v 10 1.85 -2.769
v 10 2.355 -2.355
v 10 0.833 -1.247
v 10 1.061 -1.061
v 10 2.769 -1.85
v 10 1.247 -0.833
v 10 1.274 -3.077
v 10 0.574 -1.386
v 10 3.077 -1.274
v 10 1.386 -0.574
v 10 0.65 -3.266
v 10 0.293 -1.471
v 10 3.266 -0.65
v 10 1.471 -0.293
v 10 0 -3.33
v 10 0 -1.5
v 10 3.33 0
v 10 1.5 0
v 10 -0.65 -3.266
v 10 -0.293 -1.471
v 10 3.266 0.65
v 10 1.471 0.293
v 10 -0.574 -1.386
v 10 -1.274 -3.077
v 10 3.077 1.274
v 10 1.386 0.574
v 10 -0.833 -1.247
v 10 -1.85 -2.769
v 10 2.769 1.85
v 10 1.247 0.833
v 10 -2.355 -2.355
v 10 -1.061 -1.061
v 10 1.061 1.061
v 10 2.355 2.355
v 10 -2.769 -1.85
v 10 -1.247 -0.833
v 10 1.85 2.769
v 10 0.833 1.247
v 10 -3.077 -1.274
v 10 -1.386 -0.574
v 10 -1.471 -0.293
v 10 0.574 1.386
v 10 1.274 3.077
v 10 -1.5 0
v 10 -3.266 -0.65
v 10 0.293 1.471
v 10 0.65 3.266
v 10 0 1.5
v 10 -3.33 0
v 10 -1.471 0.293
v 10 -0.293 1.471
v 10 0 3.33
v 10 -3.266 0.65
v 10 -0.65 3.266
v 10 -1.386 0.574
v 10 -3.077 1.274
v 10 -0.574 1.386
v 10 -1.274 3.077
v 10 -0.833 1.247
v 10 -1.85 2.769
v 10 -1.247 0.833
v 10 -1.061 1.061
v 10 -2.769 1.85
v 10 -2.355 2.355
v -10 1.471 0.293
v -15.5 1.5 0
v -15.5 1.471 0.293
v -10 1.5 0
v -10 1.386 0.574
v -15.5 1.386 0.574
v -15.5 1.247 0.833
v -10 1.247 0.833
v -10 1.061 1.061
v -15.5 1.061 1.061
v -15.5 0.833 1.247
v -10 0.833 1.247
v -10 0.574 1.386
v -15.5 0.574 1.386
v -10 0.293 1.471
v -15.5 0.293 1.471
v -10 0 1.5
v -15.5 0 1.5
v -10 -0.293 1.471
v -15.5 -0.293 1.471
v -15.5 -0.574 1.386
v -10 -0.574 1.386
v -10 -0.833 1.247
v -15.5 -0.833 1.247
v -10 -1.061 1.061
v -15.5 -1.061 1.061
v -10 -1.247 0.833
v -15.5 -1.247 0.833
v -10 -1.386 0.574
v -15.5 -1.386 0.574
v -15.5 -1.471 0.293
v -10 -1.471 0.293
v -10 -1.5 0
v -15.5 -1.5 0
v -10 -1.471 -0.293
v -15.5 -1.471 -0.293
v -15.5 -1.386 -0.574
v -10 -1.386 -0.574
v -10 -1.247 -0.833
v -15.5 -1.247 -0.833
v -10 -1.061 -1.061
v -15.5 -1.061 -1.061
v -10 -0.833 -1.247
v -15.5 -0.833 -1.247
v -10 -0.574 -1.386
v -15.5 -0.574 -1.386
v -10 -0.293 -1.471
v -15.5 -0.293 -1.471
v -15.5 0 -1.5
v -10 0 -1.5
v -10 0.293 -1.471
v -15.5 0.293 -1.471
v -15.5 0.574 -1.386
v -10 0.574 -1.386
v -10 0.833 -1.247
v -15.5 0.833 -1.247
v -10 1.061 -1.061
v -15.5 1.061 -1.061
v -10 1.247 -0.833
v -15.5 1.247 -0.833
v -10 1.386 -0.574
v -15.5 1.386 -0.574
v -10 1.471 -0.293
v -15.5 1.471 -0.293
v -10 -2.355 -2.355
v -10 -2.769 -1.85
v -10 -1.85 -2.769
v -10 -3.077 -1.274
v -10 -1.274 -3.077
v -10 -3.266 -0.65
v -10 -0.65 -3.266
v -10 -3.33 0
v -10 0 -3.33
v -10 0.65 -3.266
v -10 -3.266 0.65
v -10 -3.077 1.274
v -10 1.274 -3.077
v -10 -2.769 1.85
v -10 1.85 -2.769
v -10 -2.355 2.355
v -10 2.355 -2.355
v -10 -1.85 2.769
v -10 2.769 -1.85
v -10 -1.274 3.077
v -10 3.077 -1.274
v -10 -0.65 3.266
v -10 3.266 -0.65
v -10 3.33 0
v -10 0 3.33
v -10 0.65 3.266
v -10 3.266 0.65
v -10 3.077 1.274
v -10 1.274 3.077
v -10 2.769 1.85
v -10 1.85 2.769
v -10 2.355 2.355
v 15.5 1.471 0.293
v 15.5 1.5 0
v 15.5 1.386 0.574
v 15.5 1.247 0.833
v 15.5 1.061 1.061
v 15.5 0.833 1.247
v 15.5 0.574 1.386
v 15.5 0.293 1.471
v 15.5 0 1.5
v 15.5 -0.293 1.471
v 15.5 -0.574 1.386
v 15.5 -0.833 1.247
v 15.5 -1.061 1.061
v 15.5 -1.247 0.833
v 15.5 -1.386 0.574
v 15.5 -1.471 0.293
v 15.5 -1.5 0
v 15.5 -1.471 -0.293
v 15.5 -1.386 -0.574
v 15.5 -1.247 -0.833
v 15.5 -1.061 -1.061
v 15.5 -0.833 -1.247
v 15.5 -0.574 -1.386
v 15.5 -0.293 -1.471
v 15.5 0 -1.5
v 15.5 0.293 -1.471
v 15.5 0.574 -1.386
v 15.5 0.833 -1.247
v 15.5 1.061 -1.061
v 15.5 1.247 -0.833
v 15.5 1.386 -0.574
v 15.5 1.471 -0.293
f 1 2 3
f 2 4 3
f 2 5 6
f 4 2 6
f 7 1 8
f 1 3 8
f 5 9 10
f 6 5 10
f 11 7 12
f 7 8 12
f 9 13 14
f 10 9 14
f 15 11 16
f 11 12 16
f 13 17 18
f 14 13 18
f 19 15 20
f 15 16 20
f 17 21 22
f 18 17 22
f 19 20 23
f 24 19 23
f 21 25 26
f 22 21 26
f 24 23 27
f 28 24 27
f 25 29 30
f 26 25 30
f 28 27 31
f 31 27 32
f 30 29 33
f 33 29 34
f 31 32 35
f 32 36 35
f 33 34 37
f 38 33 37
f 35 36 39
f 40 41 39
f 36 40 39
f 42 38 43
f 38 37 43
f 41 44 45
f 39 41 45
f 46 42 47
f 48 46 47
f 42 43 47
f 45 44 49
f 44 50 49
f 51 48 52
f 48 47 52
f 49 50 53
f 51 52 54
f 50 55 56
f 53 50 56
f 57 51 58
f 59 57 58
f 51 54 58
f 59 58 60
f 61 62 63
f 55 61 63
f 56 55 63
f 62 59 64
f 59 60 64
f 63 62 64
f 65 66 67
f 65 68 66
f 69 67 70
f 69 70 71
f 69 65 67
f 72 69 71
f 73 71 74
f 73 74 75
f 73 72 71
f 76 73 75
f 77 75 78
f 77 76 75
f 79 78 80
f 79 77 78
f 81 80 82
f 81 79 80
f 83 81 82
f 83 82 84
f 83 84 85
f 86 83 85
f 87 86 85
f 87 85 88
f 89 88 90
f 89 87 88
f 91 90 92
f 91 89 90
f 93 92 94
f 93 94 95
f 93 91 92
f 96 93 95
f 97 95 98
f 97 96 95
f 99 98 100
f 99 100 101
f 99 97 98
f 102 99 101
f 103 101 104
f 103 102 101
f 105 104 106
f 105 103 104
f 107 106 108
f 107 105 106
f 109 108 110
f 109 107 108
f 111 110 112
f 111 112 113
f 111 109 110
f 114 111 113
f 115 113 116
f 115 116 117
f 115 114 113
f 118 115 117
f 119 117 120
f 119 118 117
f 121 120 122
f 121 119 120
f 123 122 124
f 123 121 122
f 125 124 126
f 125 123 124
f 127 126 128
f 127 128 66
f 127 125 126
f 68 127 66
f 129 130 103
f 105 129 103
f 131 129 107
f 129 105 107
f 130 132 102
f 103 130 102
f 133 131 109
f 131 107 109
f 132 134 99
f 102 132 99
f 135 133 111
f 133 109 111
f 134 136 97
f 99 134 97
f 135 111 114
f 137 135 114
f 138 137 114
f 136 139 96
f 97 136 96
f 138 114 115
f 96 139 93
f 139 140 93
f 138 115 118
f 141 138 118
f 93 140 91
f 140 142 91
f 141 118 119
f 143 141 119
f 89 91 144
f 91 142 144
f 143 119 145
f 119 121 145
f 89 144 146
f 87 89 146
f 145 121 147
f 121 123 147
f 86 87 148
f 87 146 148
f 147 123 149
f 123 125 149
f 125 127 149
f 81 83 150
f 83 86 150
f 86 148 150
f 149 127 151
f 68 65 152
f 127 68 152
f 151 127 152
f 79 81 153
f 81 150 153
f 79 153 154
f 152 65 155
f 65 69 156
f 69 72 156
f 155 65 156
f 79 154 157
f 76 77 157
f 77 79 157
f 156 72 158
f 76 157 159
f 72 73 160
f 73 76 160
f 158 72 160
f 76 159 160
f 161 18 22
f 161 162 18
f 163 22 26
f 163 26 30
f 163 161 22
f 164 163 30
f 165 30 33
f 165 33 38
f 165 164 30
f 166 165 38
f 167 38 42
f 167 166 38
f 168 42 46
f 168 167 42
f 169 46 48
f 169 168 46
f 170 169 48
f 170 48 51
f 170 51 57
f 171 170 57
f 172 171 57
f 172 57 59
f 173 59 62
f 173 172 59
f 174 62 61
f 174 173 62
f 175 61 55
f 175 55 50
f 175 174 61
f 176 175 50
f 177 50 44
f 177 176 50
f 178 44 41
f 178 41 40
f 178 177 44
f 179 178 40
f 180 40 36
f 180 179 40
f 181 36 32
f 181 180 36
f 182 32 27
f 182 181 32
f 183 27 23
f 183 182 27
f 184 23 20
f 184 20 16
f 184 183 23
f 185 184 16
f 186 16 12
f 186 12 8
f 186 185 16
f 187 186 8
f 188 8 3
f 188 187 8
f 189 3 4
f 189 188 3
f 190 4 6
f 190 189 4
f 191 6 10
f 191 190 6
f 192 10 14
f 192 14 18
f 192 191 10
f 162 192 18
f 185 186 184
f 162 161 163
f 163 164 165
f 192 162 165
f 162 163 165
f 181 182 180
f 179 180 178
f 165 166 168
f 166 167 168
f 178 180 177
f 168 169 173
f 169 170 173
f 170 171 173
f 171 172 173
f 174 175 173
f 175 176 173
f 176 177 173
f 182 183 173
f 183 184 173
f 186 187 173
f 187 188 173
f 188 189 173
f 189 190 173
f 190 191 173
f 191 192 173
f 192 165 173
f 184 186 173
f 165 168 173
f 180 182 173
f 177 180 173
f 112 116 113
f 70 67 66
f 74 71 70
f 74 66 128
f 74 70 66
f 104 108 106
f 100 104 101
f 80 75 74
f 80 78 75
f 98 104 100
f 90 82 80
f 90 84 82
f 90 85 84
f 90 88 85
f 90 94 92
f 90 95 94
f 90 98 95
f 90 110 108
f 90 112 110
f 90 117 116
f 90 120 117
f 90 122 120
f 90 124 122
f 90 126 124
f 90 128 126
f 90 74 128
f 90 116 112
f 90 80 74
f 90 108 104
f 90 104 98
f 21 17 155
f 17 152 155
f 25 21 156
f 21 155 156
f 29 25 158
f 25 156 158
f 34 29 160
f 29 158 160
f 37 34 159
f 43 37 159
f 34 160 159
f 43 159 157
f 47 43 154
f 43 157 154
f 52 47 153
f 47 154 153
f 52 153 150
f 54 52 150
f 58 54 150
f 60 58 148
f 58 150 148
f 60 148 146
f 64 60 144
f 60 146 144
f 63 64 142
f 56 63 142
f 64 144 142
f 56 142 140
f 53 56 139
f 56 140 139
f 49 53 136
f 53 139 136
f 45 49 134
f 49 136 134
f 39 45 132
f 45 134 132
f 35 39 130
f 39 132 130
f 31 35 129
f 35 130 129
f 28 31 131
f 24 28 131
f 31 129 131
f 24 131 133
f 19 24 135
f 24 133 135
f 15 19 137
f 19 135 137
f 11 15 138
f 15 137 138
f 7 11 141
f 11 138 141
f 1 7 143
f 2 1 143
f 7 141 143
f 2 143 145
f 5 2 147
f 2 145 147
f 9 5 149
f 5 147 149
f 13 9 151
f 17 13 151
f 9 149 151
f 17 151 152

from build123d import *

# Parameters (mm, degrees)
SKETCH1_W = 5.5
SKETCH1_H = 1.5


with BuildPart() as part:
    # Sketch1 → Revolve1 (revolve)
    with BuildSketch(Plane.XY):
        Polygon((-10, 0), (10, 0), (10, 1.5), (10, 3.33), (-10, 3.33), (-10, 1.5), align=None)
        with Locations((-12.75, 0.75)):
            Rectangle(SKETCH1_W, SKETCH1_H)
        with Locations((12.75, 0.75)):
            Rectangle(SKETCH1_W, SKETCH1_H)
    revolve(axis=Axis((-15.5, 0, 0), (1, 0, 0)))


solid = part.part
